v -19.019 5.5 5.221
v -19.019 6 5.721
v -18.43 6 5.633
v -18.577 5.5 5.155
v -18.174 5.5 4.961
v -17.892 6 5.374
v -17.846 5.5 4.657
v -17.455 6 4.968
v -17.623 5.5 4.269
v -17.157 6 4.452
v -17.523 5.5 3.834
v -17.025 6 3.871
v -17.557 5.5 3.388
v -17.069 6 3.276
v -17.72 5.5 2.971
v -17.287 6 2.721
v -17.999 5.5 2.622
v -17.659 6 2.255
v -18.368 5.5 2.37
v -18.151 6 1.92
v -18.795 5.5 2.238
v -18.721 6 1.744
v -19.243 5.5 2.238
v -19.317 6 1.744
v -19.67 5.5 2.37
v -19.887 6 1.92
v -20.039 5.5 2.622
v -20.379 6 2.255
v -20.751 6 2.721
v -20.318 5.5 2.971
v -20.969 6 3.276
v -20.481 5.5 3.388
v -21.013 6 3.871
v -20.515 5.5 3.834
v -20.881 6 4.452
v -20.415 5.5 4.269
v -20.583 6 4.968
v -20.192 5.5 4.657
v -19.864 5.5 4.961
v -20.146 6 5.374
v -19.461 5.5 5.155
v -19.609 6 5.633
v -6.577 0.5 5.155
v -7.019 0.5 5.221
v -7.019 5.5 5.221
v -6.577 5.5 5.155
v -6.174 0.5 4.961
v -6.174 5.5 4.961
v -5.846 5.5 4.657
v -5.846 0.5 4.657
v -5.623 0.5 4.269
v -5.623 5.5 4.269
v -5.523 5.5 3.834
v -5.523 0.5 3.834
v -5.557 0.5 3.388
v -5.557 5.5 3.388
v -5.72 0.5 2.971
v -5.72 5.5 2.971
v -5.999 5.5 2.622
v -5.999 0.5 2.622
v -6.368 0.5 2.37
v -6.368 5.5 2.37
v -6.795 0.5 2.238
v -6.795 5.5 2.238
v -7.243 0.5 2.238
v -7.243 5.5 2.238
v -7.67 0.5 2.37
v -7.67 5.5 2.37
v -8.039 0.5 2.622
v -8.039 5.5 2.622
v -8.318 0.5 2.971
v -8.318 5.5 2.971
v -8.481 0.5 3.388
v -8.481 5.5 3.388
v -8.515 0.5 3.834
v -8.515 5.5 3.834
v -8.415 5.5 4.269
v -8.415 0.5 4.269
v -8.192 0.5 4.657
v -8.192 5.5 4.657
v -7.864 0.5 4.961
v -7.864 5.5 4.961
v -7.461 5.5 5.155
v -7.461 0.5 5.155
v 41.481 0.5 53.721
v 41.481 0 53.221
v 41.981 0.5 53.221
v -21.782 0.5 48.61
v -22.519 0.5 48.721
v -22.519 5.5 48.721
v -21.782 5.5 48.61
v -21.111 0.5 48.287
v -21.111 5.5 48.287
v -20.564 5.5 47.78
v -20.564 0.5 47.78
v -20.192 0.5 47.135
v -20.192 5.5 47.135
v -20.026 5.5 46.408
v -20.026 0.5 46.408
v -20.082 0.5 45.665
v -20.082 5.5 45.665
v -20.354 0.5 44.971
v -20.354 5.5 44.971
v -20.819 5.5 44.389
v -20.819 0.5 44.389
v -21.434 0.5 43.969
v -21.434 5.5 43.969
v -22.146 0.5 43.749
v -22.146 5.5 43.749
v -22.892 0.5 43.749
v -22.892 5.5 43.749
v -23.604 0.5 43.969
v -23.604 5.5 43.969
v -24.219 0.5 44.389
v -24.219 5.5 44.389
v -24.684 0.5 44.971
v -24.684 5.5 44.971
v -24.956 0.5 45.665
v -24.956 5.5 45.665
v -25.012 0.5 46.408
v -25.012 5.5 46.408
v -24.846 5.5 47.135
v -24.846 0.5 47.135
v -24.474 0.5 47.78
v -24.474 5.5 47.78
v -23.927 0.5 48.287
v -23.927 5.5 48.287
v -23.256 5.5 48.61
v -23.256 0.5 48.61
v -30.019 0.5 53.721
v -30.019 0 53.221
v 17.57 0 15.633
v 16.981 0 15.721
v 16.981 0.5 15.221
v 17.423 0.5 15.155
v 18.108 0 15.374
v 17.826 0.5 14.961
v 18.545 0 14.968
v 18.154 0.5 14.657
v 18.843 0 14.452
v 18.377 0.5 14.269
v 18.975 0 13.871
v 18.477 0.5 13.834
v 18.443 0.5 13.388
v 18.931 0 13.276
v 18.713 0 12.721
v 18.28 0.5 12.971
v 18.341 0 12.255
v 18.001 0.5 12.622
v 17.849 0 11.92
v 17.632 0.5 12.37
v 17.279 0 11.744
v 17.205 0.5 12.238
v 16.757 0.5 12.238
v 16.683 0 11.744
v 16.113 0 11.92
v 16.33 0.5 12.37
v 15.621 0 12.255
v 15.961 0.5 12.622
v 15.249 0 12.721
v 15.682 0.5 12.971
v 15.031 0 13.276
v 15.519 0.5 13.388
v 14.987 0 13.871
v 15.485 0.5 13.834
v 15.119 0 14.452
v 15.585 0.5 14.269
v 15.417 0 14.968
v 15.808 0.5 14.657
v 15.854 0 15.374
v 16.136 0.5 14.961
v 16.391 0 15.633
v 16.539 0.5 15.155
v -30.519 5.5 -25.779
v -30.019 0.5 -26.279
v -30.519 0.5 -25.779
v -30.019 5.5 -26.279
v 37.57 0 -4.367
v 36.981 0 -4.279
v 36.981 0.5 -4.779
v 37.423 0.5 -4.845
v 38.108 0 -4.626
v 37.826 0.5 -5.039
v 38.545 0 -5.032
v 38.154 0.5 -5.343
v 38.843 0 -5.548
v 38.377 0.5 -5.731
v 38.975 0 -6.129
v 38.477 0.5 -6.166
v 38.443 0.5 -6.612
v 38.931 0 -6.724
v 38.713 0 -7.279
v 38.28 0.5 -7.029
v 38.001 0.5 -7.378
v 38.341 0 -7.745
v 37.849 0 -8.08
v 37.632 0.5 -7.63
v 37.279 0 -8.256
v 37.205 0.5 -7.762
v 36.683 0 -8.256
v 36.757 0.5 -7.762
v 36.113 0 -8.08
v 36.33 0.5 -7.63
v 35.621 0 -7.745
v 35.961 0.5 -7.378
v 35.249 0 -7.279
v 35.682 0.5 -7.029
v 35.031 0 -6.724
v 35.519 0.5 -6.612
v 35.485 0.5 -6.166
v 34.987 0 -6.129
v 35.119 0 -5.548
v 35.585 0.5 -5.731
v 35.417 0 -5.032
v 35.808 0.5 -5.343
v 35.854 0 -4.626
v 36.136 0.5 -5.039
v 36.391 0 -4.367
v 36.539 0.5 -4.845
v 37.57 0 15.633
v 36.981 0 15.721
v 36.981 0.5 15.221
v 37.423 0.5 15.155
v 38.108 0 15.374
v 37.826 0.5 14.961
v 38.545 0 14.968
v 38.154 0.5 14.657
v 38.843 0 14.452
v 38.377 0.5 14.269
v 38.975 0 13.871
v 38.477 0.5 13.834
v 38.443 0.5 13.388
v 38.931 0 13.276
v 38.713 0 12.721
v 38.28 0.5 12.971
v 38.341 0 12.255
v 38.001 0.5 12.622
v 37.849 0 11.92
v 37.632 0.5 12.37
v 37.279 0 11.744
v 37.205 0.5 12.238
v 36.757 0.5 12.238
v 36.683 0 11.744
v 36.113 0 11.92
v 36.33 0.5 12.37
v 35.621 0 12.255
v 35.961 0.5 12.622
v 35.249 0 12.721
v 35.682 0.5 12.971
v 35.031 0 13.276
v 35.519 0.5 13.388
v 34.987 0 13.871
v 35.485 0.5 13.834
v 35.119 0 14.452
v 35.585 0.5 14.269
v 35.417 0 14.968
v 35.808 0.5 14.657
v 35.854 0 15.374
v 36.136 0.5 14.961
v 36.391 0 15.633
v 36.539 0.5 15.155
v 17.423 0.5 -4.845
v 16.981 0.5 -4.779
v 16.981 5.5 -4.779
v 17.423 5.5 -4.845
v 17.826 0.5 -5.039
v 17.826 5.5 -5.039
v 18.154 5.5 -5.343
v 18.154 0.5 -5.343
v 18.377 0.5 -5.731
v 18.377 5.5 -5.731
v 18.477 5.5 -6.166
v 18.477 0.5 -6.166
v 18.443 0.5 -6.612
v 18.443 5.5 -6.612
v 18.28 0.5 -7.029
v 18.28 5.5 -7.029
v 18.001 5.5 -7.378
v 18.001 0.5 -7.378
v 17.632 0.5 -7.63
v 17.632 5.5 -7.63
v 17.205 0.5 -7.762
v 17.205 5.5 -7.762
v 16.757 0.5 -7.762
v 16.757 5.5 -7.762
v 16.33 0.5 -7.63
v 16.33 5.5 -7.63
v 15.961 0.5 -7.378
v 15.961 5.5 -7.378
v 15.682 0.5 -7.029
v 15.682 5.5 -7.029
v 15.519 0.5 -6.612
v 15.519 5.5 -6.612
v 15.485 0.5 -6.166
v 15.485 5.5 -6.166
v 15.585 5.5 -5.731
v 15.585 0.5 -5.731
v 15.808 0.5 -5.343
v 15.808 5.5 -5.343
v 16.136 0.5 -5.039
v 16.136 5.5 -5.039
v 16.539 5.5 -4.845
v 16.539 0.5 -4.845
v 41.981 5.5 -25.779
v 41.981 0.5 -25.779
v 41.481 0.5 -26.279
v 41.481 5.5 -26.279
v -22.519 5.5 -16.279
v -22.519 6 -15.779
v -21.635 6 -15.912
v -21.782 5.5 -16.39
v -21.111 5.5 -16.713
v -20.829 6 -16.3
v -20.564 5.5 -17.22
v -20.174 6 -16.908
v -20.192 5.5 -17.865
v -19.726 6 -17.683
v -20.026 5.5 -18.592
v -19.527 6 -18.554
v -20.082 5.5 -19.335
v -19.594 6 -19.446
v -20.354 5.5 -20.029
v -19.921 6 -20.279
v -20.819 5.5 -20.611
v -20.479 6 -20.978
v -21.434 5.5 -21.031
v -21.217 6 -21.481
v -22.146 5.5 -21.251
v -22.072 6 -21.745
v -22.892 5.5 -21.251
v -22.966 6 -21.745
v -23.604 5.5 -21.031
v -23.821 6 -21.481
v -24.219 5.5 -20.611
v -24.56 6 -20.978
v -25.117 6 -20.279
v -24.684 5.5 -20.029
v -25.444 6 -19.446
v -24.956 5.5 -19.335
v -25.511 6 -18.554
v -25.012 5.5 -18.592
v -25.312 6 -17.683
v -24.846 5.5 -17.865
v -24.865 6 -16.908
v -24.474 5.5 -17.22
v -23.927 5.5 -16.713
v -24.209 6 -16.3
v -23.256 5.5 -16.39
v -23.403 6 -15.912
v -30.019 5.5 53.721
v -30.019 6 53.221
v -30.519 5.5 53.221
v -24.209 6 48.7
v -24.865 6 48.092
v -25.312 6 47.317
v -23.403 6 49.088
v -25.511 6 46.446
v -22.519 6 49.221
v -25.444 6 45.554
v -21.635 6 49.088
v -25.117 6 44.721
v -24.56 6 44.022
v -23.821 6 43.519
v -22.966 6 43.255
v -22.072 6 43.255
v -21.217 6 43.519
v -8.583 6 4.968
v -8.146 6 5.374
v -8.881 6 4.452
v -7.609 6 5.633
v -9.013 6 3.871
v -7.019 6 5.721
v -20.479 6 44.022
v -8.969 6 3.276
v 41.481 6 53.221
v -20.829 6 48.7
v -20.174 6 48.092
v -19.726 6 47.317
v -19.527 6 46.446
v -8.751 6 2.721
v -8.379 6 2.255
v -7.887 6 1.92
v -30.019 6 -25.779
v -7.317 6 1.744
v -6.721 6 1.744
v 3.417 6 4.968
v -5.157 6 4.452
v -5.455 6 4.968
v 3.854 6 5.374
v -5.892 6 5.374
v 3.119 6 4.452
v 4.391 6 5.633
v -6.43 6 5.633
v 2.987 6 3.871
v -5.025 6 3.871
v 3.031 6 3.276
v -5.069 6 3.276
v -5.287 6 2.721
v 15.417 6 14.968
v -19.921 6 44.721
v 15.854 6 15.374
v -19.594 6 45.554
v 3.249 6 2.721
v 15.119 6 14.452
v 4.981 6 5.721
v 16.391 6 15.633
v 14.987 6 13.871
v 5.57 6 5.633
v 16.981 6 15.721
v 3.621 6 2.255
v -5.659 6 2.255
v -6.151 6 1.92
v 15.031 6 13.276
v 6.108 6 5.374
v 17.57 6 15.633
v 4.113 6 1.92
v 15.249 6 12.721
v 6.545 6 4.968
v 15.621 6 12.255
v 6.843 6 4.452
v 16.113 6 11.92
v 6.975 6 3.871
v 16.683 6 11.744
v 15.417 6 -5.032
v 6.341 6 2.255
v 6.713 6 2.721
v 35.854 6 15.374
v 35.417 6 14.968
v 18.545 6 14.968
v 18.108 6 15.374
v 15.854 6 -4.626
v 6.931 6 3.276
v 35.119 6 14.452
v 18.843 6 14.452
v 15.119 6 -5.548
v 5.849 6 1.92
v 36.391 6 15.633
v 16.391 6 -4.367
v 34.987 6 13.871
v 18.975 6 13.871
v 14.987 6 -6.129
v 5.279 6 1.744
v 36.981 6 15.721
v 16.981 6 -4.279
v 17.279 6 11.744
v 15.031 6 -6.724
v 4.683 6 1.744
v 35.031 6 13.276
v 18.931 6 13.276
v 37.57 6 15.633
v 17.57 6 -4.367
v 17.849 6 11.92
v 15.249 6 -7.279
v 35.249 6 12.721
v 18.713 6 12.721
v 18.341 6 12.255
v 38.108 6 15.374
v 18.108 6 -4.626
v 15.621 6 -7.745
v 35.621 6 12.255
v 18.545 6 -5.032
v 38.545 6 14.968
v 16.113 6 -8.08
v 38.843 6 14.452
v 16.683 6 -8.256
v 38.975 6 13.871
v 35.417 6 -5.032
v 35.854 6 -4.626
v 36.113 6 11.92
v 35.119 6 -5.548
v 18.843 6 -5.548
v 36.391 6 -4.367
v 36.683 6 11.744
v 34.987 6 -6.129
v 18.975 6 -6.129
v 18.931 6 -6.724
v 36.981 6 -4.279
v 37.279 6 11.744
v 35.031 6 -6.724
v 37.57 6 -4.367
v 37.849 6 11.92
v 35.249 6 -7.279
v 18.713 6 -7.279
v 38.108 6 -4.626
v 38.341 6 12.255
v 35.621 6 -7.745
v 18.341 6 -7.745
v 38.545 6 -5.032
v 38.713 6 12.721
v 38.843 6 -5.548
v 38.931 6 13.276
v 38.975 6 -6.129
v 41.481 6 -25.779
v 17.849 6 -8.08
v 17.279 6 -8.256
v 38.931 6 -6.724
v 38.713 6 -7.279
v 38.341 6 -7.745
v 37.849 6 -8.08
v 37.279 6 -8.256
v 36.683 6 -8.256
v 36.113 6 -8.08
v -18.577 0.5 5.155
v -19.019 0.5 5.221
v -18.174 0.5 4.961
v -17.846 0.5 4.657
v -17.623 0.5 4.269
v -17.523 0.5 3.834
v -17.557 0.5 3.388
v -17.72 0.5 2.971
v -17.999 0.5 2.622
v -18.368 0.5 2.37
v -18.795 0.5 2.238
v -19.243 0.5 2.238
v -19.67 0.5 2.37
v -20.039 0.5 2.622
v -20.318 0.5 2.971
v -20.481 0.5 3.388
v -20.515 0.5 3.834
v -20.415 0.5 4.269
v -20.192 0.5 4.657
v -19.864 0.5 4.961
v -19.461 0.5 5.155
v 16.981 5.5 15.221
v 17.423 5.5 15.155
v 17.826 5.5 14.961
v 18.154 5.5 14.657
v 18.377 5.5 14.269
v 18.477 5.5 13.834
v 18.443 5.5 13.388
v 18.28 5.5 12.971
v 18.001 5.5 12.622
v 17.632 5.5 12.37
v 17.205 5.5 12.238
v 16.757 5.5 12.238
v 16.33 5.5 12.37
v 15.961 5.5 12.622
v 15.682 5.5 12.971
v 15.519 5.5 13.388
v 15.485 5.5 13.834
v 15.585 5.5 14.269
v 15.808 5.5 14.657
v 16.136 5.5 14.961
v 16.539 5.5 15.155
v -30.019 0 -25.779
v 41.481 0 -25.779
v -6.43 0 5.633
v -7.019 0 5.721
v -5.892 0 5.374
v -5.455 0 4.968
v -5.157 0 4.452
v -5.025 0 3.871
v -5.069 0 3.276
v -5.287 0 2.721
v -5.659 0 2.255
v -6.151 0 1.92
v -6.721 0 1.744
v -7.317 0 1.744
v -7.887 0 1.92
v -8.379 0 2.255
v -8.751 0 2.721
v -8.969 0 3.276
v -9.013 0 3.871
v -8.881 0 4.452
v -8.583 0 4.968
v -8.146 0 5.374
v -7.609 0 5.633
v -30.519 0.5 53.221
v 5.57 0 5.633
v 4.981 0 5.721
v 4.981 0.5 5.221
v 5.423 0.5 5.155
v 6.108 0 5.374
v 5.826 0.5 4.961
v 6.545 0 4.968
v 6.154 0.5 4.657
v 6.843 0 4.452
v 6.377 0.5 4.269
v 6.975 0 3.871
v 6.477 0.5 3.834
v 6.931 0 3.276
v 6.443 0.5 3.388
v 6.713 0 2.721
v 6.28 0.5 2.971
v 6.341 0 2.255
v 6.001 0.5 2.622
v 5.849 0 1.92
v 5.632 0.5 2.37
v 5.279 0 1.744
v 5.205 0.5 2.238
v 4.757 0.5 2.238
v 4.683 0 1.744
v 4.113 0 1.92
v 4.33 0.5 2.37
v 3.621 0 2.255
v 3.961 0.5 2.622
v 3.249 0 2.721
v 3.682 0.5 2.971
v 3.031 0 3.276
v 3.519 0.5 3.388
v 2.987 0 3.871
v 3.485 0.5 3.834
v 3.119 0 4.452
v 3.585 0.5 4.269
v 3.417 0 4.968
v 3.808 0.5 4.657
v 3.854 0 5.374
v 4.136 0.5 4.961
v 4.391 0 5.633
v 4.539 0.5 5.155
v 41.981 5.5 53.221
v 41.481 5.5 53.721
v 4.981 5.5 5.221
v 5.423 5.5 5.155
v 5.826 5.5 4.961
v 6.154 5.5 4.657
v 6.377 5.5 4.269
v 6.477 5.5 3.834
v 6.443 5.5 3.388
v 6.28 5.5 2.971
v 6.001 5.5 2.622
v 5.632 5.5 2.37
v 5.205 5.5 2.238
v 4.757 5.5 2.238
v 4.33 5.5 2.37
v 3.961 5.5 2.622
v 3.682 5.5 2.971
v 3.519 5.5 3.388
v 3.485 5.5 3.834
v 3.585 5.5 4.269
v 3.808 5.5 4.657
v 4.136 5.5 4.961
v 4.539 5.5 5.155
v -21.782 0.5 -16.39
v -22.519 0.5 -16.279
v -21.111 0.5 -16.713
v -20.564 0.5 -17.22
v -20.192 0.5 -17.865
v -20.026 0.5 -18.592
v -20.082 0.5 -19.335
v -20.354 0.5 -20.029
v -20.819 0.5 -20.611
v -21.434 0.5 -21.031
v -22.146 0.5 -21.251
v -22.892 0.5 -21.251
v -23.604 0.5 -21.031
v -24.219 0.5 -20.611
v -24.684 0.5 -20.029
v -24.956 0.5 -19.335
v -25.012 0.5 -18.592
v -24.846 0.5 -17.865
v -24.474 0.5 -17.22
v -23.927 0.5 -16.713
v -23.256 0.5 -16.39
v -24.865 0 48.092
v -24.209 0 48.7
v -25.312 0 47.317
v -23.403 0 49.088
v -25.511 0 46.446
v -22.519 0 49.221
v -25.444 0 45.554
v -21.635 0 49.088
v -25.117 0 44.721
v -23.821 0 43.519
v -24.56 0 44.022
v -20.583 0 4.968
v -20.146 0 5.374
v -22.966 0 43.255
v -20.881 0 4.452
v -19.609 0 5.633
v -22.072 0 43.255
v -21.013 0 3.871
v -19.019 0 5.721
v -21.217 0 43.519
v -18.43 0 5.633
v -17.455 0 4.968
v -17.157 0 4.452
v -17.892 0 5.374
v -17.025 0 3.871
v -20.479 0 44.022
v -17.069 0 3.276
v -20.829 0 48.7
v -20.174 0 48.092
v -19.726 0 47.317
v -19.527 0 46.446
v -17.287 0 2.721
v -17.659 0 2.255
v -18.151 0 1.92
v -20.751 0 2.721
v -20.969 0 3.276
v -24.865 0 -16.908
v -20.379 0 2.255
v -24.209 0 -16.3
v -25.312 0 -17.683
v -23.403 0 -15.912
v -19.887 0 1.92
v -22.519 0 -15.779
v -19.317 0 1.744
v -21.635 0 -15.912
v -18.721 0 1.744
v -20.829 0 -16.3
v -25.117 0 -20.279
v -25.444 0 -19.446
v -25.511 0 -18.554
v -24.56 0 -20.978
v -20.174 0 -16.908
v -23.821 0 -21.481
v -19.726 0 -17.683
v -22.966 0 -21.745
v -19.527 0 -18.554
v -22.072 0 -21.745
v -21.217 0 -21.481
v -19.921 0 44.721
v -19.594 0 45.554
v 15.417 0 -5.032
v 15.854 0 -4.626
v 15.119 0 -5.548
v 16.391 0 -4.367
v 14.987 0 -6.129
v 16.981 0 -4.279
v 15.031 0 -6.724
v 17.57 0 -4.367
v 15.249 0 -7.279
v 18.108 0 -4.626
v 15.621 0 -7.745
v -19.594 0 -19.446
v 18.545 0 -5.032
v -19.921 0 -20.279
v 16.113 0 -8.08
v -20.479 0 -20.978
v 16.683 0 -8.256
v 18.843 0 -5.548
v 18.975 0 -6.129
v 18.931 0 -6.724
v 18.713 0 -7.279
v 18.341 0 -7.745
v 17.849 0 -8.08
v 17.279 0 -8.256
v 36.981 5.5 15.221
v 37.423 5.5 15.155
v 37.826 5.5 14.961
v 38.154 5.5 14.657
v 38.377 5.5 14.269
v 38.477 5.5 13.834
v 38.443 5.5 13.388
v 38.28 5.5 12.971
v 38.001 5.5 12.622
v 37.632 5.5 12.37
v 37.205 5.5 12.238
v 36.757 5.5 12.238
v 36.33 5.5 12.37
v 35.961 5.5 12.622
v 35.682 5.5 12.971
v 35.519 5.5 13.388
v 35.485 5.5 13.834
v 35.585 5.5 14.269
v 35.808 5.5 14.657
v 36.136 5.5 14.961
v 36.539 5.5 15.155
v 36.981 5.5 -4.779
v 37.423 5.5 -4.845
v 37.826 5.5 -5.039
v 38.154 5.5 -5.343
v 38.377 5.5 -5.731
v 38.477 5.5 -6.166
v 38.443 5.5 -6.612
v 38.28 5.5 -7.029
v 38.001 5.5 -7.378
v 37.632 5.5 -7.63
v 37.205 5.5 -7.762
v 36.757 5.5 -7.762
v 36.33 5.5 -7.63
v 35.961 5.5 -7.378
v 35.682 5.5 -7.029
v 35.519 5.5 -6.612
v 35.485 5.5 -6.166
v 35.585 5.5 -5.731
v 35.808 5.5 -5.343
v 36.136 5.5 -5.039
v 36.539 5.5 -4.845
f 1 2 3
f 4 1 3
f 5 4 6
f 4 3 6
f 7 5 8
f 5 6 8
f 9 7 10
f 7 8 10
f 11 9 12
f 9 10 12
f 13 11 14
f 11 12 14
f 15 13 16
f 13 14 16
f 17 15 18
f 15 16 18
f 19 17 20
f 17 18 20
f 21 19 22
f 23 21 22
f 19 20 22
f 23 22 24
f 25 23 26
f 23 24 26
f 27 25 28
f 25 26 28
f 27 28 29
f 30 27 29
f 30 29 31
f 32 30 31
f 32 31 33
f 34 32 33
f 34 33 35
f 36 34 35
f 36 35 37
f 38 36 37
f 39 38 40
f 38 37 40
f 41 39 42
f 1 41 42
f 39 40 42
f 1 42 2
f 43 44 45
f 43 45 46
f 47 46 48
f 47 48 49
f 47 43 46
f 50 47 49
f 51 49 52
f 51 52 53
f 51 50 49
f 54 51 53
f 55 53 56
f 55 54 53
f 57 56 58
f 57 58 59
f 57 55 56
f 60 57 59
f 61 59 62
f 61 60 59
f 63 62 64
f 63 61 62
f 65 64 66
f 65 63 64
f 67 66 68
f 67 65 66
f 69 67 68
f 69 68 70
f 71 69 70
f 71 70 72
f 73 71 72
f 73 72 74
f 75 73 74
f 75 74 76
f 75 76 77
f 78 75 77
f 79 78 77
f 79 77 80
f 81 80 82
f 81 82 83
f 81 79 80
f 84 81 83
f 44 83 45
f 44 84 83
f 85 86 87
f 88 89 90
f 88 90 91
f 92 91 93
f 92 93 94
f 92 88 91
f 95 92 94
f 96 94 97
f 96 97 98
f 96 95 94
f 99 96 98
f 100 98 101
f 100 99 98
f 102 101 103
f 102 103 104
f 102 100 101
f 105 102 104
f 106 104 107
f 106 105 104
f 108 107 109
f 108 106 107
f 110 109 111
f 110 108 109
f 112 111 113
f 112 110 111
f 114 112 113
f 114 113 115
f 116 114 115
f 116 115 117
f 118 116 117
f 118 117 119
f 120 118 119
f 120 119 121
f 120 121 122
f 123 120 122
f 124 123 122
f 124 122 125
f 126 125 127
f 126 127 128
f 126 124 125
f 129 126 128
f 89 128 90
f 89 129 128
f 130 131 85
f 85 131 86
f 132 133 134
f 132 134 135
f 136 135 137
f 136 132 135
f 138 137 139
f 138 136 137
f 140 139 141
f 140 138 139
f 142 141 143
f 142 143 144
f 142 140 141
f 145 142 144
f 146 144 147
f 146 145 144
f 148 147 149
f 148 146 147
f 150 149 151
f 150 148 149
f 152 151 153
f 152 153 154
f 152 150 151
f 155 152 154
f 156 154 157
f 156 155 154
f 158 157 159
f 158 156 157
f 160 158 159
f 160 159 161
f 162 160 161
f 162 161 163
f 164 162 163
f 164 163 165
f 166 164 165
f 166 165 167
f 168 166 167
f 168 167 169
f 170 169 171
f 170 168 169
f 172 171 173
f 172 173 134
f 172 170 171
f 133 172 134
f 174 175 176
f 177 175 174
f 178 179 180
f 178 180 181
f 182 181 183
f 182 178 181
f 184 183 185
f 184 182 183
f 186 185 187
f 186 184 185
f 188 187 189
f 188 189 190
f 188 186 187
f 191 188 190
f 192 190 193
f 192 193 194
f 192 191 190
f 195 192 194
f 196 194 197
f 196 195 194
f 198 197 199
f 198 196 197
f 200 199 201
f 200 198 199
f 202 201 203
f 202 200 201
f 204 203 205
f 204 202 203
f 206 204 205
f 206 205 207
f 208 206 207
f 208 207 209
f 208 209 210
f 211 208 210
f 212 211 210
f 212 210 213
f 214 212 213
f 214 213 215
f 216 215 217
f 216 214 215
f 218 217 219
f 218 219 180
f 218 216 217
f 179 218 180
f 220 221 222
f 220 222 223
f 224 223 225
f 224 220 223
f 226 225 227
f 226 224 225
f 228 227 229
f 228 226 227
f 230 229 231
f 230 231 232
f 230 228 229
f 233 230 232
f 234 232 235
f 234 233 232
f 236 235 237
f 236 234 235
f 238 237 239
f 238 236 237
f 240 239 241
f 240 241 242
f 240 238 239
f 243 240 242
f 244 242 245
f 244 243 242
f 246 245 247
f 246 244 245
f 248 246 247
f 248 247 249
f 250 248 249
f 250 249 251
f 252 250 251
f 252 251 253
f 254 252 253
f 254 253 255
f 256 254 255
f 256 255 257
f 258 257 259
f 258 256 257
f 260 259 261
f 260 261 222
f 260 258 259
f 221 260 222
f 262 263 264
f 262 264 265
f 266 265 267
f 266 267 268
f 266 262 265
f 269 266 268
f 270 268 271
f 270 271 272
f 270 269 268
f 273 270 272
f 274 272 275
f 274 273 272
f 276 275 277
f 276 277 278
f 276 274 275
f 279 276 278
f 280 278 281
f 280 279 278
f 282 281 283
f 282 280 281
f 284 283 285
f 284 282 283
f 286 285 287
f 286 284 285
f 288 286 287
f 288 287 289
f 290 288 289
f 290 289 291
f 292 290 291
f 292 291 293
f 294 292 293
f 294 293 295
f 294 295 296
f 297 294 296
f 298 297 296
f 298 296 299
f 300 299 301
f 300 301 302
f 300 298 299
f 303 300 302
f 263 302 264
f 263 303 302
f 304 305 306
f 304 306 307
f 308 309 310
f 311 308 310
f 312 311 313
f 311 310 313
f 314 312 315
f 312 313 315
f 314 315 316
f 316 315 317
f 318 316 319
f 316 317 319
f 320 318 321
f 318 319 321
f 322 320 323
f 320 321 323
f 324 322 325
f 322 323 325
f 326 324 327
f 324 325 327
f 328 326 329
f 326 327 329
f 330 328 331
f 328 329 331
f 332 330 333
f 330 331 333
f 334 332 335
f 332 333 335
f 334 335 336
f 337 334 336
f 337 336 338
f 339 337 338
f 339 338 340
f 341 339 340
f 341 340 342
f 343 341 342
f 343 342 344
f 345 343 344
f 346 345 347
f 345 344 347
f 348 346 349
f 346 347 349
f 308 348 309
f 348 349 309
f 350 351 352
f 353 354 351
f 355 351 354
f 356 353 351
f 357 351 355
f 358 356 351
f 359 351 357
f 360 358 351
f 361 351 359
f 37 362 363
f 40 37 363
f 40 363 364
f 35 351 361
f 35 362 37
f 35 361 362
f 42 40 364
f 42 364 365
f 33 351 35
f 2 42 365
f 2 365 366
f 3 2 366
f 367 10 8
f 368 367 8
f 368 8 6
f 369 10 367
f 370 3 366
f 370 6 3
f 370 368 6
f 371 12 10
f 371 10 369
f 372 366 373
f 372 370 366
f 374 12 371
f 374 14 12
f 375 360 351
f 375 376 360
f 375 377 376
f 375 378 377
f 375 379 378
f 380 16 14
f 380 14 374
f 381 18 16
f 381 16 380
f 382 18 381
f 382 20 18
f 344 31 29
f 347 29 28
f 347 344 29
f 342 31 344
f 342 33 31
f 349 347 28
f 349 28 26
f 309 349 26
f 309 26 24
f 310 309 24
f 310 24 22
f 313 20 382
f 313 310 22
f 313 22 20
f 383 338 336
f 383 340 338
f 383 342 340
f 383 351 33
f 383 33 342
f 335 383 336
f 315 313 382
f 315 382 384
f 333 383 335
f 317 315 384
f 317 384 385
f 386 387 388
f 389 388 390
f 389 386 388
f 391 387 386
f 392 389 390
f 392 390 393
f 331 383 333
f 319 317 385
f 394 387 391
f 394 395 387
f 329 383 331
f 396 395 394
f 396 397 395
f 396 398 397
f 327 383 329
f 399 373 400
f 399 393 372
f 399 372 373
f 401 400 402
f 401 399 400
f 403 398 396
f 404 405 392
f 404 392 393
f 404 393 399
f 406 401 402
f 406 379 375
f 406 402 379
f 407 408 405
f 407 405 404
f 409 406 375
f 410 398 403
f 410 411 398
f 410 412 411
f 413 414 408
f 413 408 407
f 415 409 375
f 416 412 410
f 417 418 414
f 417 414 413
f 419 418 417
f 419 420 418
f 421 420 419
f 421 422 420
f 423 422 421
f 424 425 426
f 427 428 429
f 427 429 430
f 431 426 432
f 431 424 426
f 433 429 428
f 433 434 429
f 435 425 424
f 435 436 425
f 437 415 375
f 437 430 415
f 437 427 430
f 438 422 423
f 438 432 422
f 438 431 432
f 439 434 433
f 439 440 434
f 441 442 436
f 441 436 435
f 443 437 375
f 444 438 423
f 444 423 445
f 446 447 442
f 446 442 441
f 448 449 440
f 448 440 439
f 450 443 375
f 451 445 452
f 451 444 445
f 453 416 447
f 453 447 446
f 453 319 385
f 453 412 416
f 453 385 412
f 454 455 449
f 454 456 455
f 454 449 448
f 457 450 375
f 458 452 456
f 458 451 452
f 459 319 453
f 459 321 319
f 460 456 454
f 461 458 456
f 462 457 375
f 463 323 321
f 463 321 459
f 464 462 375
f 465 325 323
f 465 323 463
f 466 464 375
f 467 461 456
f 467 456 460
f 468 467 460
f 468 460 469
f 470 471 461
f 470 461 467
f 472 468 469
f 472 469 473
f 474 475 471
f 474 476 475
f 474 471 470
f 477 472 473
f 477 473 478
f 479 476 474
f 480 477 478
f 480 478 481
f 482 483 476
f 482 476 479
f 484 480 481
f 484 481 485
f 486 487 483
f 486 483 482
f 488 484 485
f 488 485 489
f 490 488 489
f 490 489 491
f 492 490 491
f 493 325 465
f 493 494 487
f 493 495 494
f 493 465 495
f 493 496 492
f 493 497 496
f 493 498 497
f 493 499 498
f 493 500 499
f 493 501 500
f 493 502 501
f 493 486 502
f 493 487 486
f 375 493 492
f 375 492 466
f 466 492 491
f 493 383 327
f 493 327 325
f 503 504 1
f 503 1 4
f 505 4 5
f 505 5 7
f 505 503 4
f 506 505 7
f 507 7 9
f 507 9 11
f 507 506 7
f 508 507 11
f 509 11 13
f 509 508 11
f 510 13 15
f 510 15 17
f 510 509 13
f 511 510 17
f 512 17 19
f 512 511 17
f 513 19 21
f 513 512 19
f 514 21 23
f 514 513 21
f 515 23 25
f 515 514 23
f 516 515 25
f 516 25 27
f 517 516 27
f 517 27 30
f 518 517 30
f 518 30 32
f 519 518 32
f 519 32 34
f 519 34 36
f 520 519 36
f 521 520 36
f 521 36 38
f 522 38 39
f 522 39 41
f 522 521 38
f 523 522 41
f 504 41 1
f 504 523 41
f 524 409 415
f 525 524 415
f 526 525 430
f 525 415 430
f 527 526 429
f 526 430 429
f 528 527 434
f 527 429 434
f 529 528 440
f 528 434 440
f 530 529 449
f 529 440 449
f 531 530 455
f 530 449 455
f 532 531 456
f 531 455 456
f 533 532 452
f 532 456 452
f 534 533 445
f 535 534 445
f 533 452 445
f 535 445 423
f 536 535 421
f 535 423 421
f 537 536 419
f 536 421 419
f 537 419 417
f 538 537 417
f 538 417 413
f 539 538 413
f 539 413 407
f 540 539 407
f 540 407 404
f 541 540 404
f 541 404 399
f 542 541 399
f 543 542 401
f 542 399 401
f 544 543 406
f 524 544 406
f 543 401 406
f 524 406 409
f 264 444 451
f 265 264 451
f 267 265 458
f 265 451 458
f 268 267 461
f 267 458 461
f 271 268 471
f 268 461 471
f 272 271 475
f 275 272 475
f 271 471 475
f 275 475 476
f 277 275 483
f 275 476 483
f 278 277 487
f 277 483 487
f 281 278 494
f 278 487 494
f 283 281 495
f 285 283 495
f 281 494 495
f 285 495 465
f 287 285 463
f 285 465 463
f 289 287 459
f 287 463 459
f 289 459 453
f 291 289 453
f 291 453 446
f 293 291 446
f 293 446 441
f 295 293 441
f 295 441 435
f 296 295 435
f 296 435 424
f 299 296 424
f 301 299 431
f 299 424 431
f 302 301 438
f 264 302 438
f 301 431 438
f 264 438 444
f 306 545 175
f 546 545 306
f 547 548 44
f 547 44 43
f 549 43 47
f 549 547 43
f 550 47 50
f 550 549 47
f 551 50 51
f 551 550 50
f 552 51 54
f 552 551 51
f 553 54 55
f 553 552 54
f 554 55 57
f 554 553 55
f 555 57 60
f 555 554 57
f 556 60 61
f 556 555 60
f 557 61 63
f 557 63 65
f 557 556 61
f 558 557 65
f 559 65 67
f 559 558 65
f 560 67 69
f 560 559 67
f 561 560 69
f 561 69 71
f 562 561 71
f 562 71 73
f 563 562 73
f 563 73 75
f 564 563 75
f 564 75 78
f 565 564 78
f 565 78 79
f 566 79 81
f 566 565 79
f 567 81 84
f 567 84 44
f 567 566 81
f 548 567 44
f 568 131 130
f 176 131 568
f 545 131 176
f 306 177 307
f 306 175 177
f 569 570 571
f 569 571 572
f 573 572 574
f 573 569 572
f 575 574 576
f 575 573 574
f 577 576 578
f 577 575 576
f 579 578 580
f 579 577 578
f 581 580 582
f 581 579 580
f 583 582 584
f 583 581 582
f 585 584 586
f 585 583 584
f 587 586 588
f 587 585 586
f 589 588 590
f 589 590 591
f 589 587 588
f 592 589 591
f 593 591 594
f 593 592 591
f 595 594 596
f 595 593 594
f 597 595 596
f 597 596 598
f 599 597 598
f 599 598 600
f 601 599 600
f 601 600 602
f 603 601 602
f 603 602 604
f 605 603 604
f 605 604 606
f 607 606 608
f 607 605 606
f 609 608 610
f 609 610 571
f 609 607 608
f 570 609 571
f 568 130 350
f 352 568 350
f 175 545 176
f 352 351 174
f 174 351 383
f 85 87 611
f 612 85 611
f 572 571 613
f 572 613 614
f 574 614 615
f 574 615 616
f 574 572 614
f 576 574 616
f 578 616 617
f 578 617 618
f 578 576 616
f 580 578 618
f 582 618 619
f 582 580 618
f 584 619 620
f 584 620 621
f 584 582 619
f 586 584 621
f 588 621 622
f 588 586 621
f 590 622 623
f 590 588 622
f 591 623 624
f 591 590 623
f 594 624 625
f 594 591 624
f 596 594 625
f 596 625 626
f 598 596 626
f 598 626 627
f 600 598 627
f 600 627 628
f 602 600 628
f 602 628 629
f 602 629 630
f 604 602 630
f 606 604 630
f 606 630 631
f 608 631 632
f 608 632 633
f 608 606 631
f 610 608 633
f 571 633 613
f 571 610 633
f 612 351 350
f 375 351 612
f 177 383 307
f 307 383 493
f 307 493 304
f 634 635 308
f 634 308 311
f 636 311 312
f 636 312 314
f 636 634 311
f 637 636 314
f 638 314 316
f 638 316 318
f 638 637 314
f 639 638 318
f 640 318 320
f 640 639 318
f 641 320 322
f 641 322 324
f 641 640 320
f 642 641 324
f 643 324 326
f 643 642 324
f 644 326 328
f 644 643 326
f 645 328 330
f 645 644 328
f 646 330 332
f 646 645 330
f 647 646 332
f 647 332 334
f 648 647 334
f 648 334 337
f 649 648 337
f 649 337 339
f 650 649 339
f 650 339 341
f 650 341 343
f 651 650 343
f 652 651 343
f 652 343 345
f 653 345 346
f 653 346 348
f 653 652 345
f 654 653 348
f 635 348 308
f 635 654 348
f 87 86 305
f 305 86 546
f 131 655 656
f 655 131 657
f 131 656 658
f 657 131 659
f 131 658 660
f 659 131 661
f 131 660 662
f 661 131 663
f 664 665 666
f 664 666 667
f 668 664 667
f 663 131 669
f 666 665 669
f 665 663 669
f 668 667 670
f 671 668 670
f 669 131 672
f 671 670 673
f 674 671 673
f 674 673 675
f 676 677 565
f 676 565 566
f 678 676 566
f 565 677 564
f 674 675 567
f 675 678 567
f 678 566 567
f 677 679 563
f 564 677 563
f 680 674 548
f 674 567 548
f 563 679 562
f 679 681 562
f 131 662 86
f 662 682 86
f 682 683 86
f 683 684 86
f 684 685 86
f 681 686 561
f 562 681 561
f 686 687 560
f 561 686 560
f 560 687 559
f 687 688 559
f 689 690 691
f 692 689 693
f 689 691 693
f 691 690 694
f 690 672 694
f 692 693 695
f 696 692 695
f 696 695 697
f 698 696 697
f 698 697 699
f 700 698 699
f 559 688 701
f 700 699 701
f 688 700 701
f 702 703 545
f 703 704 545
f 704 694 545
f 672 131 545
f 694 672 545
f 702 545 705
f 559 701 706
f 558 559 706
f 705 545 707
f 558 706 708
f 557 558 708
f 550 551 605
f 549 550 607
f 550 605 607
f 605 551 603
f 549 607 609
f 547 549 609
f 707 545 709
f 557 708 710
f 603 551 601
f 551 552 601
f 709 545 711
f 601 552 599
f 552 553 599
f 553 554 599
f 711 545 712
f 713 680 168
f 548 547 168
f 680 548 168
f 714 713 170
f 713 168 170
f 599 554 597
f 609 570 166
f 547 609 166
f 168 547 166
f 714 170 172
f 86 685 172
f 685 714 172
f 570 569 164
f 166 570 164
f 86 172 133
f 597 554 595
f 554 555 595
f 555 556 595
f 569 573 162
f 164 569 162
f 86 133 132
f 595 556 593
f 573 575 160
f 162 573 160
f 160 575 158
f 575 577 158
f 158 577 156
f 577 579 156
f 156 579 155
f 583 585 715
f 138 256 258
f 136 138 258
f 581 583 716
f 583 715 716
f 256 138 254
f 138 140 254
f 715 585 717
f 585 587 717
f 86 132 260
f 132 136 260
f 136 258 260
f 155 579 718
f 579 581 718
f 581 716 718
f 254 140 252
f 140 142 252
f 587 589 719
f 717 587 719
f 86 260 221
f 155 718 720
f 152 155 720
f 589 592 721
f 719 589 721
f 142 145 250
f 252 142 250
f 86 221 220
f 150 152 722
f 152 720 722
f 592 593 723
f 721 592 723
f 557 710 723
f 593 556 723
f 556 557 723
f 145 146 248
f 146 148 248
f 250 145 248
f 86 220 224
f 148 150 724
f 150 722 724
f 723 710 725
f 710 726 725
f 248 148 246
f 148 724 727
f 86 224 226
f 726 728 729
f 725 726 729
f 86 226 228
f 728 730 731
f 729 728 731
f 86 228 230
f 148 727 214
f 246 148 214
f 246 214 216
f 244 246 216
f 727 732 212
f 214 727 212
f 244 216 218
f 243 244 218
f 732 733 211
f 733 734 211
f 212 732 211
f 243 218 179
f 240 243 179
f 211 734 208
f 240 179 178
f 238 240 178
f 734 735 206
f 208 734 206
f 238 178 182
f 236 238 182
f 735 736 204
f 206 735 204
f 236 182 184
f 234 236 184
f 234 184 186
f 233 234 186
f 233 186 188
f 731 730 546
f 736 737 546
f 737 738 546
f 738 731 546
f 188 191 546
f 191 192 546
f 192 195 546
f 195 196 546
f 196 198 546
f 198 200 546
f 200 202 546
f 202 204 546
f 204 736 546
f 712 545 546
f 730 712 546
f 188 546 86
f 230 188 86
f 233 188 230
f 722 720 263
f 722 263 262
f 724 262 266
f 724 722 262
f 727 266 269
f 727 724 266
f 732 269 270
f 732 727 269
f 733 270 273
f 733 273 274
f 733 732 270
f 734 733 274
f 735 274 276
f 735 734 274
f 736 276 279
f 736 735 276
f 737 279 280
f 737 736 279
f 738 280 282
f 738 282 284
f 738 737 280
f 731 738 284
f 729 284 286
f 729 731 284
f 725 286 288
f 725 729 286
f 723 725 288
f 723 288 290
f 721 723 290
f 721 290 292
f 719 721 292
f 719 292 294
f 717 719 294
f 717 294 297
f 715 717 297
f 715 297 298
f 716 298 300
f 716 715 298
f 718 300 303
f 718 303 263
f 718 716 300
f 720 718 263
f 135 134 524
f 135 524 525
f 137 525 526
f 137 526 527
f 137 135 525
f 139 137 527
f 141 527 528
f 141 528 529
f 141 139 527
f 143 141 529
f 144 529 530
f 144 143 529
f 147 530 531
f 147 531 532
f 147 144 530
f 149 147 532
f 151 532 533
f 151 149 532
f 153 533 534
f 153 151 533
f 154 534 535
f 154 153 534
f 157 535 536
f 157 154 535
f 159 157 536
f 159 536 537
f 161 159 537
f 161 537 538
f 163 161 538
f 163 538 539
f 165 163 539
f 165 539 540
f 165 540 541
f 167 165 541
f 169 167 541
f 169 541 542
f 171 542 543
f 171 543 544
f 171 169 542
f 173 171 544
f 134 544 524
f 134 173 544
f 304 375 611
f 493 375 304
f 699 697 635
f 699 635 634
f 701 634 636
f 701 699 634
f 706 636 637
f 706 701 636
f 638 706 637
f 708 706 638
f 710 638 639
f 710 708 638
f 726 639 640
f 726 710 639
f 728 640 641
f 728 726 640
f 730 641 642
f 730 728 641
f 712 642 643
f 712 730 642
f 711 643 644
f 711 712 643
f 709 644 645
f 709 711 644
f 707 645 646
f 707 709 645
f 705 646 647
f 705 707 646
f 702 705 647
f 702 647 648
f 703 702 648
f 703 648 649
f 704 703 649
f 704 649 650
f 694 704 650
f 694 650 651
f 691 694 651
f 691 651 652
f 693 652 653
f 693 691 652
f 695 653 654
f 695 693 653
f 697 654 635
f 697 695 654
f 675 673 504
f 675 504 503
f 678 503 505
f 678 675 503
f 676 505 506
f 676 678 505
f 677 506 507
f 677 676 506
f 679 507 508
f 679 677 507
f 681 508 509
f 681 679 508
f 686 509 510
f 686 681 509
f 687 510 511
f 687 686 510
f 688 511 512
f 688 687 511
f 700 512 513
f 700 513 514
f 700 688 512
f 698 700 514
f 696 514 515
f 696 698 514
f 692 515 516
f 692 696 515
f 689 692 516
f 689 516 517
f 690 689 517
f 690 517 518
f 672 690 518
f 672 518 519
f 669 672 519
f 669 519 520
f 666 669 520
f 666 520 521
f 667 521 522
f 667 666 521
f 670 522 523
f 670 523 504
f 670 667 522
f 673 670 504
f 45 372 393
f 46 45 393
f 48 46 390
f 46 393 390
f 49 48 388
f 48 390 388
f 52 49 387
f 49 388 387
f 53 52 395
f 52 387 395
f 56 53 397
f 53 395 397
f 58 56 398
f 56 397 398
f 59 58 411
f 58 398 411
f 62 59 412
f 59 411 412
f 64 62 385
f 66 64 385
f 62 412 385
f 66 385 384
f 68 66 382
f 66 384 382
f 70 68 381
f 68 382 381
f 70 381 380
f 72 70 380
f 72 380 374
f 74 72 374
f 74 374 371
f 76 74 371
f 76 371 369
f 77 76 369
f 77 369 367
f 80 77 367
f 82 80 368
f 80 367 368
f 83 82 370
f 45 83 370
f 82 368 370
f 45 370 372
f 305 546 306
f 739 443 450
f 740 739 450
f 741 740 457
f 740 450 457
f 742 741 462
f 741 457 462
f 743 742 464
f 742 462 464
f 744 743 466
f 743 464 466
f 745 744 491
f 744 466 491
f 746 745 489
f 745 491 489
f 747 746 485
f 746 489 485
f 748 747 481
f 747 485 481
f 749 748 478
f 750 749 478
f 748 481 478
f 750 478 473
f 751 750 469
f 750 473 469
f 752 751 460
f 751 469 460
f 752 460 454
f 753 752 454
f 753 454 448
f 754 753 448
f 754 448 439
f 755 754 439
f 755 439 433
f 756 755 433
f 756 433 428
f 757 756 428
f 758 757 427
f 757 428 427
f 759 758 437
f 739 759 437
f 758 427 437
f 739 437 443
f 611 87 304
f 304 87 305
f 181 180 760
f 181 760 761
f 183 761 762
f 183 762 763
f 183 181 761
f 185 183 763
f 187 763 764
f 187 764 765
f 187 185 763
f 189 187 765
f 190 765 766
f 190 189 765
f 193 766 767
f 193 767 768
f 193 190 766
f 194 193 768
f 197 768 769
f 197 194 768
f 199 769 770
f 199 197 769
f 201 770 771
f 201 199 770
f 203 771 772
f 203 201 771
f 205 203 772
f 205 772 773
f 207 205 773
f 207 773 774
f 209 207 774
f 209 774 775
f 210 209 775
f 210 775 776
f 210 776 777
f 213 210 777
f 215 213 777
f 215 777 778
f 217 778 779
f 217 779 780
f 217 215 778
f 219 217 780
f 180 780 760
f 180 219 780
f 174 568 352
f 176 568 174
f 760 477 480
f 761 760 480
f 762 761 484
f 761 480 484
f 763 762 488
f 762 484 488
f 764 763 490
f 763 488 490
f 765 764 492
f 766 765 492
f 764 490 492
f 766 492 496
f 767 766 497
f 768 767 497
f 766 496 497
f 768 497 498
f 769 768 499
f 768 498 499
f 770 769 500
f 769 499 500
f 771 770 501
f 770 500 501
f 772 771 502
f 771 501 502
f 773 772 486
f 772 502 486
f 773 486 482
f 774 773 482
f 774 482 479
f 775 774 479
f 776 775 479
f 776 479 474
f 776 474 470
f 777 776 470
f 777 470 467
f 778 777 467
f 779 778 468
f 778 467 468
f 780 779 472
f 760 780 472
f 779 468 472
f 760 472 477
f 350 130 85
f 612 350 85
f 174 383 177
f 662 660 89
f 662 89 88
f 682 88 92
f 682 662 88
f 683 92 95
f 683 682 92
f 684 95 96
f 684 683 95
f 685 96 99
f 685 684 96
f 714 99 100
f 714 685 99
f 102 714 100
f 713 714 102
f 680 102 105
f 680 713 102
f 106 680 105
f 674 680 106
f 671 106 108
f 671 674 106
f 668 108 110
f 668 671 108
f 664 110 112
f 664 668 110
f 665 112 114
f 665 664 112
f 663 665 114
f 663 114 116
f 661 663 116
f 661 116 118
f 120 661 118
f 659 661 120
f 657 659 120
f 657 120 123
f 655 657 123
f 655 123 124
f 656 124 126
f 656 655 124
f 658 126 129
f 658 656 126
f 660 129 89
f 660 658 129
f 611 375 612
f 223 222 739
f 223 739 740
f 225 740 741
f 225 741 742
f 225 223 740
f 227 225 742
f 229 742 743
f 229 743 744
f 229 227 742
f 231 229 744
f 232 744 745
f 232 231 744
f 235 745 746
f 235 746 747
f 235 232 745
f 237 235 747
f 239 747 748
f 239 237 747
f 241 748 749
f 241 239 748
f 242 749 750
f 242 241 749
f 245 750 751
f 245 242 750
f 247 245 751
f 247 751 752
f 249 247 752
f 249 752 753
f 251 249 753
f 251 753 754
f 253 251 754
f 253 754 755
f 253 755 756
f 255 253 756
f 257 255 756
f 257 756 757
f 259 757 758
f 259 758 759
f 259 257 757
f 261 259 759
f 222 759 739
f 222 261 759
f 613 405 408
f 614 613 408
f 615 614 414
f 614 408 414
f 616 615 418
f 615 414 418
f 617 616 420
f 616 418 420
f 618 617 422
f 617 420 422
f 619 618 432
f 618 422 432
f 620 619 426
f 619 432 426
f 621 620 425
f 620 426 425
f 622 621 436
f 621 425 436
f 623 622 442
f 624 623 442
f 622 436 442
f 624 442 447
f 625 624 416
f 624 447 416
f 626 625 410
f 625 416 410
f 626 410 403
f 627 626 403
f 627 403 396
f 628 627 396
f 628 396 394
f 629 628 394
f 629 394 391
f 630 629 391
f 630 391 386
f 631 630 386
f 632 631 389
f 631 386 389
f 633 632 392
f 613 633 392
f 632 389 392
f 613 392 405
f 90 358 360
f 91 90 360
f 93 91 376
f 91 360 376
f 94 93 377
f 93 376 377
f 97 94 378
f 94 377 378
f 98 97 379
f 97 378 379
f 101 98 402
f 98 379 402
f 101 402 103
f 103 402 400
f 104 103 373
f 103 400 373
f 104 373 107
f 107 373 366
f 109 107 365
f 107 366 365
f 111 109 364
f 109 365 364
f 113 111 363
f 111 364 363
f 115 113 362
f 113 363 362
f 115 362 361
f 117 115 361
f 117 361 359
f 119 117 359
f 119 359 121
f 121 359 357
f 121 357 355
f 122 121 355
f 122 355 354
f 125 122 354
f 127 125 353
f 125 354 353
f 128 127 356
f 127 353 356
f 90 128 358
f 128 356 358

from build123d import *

# Parameters (mm, degrees)
CROQUIS1_W              = 72.5
CROQUIS1_H              = 80
CROQUIS1_R              = 1.5
CROQUIS1_R_2            = 2.5
SALIENTE_EXTRUIR1_DEPTH = 6
CHAFL_N1_SIZE           = 0.5


with BuildPart() as part:
    # Croquis1 → Saliente-Extruir1 (new body)
    with BuildSketch(Plane(origin=(0, 0, 0), x_dir=(1, 0, 0), z_dir=(0, 1, 0))):
        with Locations((5.730956658, -13.721461187)):
            Rectangle(CROQUIS1_W, CROQUIS1_H)
        with Locations(Location((16.980956658, 6.278538813, 0), (0, 0, 270))):
            Circle(CROQUIS1_R, mode=Mode.SUBTRACT)
        with Locations(Location((36.980956658, 6.278538813, 0), (0, 0, 270))):
            Circle(CROQUIS1_R, mode=Mode.SUBTRACT)
        with Locations(Location((16.980956658, -13.721461187, 0), (0, 0, 270))):
            Circle(CROQUIS1_R, mode=Mode.SUBTRACT)
        with Locations(Location((36.980956658, -13.721461187, 0), (0, 0, 270))):
            Circle(CROQUIS1_R, mode=Mode.SUBTRACT)
        with Locations(Location((-7.019043342, -3.721461187, 0), (0, 0, 270))):
            Circle(CROQUIS1_R, mode=Mode.SUBTRACT)
        with Locations(Location((4.980956658, -3.721461187, 0), (0, 0, 270))):
            Circle(CROQUIS1_R, mode=Mode.SUBTRACT)
        with Locations(Location((-22.519043342, 18.778538813, 0), (0, 0, 270))):
            Circle(CROQUIS1_R_2, mode=Mode.SUBTRACT)
        with Locations(Location((-22.519043342, -46.221461187, 0), (0, 0, 270))):
            Circle(CROQUIS1_R_2, mode=Mode.SUBTRACT)
        with Locations(Location((-19.019043342, -3.721461187, 0), (0, 0, 270))):
            Circle(CROQUIS1_R, mode=Mode.SUBTRACT)
    extrude(amount=SALIENTE_EXTRUIR1_DEPTH)

    # Chaflán1
    chafl_n1_edges = [part.edges().sort_by_distance(p)[0] for p in [
        (41.980956658, 6, 13.721461187),
        (16.980956658, 0, -7.778538813),
        (16.980956658, 6, -7.778538813),
        (5.730956658, 6, -26.278538813),
        (36.980956658, 0, -7.778538813),
        (36.980956658, 6, -7.778538813),
        (16.980956658, 0, 12.221461187),
        (16.980956658, 6, 12.221461187),
        (36.980956658, 0, 12.221461187),
        (36.980956658, 6, 12.221461187),
        (-7.019043342, 0, 2.221461187),
        (-7.019043342, 6, 2.221461187),
        (4.980956658, 0, 2.221461187),
        (4.980956658, 6, 2.221461187),
        (-22.519043342, 0, -21.278538813),
        (-22.519043342, 6, -21.278538813),
        (-22.519043342, 0, 43.721461187),
        (-22.519043342, 6, 43.721461187),
        (-30.519043342, 6, 13.721461187),
        (-19.019043342, 0, 2.221461187),
        (-19.019043342, 6, 2.221461187),
        (5.730956658, 0, -26.278538813),
        (41.980956658, 0, 13.721461187),
        (5.730956658, 0, 53.721461187),
        (-30.519043342, 0, 13.721461187),
        (5.730956658, 6, 53.721461187),
        (-30.519043342, 3, -26.278538813),
        (41.980956658, 3, -26.278538813),
        (41.980956658, 3, 53.721461187),
        (-30.519043342, 3, 53.721461187),
    ]]
    chamfer(chafl_n1_edges, length=CHAFL_N1_SIZE)


solid = part.part
